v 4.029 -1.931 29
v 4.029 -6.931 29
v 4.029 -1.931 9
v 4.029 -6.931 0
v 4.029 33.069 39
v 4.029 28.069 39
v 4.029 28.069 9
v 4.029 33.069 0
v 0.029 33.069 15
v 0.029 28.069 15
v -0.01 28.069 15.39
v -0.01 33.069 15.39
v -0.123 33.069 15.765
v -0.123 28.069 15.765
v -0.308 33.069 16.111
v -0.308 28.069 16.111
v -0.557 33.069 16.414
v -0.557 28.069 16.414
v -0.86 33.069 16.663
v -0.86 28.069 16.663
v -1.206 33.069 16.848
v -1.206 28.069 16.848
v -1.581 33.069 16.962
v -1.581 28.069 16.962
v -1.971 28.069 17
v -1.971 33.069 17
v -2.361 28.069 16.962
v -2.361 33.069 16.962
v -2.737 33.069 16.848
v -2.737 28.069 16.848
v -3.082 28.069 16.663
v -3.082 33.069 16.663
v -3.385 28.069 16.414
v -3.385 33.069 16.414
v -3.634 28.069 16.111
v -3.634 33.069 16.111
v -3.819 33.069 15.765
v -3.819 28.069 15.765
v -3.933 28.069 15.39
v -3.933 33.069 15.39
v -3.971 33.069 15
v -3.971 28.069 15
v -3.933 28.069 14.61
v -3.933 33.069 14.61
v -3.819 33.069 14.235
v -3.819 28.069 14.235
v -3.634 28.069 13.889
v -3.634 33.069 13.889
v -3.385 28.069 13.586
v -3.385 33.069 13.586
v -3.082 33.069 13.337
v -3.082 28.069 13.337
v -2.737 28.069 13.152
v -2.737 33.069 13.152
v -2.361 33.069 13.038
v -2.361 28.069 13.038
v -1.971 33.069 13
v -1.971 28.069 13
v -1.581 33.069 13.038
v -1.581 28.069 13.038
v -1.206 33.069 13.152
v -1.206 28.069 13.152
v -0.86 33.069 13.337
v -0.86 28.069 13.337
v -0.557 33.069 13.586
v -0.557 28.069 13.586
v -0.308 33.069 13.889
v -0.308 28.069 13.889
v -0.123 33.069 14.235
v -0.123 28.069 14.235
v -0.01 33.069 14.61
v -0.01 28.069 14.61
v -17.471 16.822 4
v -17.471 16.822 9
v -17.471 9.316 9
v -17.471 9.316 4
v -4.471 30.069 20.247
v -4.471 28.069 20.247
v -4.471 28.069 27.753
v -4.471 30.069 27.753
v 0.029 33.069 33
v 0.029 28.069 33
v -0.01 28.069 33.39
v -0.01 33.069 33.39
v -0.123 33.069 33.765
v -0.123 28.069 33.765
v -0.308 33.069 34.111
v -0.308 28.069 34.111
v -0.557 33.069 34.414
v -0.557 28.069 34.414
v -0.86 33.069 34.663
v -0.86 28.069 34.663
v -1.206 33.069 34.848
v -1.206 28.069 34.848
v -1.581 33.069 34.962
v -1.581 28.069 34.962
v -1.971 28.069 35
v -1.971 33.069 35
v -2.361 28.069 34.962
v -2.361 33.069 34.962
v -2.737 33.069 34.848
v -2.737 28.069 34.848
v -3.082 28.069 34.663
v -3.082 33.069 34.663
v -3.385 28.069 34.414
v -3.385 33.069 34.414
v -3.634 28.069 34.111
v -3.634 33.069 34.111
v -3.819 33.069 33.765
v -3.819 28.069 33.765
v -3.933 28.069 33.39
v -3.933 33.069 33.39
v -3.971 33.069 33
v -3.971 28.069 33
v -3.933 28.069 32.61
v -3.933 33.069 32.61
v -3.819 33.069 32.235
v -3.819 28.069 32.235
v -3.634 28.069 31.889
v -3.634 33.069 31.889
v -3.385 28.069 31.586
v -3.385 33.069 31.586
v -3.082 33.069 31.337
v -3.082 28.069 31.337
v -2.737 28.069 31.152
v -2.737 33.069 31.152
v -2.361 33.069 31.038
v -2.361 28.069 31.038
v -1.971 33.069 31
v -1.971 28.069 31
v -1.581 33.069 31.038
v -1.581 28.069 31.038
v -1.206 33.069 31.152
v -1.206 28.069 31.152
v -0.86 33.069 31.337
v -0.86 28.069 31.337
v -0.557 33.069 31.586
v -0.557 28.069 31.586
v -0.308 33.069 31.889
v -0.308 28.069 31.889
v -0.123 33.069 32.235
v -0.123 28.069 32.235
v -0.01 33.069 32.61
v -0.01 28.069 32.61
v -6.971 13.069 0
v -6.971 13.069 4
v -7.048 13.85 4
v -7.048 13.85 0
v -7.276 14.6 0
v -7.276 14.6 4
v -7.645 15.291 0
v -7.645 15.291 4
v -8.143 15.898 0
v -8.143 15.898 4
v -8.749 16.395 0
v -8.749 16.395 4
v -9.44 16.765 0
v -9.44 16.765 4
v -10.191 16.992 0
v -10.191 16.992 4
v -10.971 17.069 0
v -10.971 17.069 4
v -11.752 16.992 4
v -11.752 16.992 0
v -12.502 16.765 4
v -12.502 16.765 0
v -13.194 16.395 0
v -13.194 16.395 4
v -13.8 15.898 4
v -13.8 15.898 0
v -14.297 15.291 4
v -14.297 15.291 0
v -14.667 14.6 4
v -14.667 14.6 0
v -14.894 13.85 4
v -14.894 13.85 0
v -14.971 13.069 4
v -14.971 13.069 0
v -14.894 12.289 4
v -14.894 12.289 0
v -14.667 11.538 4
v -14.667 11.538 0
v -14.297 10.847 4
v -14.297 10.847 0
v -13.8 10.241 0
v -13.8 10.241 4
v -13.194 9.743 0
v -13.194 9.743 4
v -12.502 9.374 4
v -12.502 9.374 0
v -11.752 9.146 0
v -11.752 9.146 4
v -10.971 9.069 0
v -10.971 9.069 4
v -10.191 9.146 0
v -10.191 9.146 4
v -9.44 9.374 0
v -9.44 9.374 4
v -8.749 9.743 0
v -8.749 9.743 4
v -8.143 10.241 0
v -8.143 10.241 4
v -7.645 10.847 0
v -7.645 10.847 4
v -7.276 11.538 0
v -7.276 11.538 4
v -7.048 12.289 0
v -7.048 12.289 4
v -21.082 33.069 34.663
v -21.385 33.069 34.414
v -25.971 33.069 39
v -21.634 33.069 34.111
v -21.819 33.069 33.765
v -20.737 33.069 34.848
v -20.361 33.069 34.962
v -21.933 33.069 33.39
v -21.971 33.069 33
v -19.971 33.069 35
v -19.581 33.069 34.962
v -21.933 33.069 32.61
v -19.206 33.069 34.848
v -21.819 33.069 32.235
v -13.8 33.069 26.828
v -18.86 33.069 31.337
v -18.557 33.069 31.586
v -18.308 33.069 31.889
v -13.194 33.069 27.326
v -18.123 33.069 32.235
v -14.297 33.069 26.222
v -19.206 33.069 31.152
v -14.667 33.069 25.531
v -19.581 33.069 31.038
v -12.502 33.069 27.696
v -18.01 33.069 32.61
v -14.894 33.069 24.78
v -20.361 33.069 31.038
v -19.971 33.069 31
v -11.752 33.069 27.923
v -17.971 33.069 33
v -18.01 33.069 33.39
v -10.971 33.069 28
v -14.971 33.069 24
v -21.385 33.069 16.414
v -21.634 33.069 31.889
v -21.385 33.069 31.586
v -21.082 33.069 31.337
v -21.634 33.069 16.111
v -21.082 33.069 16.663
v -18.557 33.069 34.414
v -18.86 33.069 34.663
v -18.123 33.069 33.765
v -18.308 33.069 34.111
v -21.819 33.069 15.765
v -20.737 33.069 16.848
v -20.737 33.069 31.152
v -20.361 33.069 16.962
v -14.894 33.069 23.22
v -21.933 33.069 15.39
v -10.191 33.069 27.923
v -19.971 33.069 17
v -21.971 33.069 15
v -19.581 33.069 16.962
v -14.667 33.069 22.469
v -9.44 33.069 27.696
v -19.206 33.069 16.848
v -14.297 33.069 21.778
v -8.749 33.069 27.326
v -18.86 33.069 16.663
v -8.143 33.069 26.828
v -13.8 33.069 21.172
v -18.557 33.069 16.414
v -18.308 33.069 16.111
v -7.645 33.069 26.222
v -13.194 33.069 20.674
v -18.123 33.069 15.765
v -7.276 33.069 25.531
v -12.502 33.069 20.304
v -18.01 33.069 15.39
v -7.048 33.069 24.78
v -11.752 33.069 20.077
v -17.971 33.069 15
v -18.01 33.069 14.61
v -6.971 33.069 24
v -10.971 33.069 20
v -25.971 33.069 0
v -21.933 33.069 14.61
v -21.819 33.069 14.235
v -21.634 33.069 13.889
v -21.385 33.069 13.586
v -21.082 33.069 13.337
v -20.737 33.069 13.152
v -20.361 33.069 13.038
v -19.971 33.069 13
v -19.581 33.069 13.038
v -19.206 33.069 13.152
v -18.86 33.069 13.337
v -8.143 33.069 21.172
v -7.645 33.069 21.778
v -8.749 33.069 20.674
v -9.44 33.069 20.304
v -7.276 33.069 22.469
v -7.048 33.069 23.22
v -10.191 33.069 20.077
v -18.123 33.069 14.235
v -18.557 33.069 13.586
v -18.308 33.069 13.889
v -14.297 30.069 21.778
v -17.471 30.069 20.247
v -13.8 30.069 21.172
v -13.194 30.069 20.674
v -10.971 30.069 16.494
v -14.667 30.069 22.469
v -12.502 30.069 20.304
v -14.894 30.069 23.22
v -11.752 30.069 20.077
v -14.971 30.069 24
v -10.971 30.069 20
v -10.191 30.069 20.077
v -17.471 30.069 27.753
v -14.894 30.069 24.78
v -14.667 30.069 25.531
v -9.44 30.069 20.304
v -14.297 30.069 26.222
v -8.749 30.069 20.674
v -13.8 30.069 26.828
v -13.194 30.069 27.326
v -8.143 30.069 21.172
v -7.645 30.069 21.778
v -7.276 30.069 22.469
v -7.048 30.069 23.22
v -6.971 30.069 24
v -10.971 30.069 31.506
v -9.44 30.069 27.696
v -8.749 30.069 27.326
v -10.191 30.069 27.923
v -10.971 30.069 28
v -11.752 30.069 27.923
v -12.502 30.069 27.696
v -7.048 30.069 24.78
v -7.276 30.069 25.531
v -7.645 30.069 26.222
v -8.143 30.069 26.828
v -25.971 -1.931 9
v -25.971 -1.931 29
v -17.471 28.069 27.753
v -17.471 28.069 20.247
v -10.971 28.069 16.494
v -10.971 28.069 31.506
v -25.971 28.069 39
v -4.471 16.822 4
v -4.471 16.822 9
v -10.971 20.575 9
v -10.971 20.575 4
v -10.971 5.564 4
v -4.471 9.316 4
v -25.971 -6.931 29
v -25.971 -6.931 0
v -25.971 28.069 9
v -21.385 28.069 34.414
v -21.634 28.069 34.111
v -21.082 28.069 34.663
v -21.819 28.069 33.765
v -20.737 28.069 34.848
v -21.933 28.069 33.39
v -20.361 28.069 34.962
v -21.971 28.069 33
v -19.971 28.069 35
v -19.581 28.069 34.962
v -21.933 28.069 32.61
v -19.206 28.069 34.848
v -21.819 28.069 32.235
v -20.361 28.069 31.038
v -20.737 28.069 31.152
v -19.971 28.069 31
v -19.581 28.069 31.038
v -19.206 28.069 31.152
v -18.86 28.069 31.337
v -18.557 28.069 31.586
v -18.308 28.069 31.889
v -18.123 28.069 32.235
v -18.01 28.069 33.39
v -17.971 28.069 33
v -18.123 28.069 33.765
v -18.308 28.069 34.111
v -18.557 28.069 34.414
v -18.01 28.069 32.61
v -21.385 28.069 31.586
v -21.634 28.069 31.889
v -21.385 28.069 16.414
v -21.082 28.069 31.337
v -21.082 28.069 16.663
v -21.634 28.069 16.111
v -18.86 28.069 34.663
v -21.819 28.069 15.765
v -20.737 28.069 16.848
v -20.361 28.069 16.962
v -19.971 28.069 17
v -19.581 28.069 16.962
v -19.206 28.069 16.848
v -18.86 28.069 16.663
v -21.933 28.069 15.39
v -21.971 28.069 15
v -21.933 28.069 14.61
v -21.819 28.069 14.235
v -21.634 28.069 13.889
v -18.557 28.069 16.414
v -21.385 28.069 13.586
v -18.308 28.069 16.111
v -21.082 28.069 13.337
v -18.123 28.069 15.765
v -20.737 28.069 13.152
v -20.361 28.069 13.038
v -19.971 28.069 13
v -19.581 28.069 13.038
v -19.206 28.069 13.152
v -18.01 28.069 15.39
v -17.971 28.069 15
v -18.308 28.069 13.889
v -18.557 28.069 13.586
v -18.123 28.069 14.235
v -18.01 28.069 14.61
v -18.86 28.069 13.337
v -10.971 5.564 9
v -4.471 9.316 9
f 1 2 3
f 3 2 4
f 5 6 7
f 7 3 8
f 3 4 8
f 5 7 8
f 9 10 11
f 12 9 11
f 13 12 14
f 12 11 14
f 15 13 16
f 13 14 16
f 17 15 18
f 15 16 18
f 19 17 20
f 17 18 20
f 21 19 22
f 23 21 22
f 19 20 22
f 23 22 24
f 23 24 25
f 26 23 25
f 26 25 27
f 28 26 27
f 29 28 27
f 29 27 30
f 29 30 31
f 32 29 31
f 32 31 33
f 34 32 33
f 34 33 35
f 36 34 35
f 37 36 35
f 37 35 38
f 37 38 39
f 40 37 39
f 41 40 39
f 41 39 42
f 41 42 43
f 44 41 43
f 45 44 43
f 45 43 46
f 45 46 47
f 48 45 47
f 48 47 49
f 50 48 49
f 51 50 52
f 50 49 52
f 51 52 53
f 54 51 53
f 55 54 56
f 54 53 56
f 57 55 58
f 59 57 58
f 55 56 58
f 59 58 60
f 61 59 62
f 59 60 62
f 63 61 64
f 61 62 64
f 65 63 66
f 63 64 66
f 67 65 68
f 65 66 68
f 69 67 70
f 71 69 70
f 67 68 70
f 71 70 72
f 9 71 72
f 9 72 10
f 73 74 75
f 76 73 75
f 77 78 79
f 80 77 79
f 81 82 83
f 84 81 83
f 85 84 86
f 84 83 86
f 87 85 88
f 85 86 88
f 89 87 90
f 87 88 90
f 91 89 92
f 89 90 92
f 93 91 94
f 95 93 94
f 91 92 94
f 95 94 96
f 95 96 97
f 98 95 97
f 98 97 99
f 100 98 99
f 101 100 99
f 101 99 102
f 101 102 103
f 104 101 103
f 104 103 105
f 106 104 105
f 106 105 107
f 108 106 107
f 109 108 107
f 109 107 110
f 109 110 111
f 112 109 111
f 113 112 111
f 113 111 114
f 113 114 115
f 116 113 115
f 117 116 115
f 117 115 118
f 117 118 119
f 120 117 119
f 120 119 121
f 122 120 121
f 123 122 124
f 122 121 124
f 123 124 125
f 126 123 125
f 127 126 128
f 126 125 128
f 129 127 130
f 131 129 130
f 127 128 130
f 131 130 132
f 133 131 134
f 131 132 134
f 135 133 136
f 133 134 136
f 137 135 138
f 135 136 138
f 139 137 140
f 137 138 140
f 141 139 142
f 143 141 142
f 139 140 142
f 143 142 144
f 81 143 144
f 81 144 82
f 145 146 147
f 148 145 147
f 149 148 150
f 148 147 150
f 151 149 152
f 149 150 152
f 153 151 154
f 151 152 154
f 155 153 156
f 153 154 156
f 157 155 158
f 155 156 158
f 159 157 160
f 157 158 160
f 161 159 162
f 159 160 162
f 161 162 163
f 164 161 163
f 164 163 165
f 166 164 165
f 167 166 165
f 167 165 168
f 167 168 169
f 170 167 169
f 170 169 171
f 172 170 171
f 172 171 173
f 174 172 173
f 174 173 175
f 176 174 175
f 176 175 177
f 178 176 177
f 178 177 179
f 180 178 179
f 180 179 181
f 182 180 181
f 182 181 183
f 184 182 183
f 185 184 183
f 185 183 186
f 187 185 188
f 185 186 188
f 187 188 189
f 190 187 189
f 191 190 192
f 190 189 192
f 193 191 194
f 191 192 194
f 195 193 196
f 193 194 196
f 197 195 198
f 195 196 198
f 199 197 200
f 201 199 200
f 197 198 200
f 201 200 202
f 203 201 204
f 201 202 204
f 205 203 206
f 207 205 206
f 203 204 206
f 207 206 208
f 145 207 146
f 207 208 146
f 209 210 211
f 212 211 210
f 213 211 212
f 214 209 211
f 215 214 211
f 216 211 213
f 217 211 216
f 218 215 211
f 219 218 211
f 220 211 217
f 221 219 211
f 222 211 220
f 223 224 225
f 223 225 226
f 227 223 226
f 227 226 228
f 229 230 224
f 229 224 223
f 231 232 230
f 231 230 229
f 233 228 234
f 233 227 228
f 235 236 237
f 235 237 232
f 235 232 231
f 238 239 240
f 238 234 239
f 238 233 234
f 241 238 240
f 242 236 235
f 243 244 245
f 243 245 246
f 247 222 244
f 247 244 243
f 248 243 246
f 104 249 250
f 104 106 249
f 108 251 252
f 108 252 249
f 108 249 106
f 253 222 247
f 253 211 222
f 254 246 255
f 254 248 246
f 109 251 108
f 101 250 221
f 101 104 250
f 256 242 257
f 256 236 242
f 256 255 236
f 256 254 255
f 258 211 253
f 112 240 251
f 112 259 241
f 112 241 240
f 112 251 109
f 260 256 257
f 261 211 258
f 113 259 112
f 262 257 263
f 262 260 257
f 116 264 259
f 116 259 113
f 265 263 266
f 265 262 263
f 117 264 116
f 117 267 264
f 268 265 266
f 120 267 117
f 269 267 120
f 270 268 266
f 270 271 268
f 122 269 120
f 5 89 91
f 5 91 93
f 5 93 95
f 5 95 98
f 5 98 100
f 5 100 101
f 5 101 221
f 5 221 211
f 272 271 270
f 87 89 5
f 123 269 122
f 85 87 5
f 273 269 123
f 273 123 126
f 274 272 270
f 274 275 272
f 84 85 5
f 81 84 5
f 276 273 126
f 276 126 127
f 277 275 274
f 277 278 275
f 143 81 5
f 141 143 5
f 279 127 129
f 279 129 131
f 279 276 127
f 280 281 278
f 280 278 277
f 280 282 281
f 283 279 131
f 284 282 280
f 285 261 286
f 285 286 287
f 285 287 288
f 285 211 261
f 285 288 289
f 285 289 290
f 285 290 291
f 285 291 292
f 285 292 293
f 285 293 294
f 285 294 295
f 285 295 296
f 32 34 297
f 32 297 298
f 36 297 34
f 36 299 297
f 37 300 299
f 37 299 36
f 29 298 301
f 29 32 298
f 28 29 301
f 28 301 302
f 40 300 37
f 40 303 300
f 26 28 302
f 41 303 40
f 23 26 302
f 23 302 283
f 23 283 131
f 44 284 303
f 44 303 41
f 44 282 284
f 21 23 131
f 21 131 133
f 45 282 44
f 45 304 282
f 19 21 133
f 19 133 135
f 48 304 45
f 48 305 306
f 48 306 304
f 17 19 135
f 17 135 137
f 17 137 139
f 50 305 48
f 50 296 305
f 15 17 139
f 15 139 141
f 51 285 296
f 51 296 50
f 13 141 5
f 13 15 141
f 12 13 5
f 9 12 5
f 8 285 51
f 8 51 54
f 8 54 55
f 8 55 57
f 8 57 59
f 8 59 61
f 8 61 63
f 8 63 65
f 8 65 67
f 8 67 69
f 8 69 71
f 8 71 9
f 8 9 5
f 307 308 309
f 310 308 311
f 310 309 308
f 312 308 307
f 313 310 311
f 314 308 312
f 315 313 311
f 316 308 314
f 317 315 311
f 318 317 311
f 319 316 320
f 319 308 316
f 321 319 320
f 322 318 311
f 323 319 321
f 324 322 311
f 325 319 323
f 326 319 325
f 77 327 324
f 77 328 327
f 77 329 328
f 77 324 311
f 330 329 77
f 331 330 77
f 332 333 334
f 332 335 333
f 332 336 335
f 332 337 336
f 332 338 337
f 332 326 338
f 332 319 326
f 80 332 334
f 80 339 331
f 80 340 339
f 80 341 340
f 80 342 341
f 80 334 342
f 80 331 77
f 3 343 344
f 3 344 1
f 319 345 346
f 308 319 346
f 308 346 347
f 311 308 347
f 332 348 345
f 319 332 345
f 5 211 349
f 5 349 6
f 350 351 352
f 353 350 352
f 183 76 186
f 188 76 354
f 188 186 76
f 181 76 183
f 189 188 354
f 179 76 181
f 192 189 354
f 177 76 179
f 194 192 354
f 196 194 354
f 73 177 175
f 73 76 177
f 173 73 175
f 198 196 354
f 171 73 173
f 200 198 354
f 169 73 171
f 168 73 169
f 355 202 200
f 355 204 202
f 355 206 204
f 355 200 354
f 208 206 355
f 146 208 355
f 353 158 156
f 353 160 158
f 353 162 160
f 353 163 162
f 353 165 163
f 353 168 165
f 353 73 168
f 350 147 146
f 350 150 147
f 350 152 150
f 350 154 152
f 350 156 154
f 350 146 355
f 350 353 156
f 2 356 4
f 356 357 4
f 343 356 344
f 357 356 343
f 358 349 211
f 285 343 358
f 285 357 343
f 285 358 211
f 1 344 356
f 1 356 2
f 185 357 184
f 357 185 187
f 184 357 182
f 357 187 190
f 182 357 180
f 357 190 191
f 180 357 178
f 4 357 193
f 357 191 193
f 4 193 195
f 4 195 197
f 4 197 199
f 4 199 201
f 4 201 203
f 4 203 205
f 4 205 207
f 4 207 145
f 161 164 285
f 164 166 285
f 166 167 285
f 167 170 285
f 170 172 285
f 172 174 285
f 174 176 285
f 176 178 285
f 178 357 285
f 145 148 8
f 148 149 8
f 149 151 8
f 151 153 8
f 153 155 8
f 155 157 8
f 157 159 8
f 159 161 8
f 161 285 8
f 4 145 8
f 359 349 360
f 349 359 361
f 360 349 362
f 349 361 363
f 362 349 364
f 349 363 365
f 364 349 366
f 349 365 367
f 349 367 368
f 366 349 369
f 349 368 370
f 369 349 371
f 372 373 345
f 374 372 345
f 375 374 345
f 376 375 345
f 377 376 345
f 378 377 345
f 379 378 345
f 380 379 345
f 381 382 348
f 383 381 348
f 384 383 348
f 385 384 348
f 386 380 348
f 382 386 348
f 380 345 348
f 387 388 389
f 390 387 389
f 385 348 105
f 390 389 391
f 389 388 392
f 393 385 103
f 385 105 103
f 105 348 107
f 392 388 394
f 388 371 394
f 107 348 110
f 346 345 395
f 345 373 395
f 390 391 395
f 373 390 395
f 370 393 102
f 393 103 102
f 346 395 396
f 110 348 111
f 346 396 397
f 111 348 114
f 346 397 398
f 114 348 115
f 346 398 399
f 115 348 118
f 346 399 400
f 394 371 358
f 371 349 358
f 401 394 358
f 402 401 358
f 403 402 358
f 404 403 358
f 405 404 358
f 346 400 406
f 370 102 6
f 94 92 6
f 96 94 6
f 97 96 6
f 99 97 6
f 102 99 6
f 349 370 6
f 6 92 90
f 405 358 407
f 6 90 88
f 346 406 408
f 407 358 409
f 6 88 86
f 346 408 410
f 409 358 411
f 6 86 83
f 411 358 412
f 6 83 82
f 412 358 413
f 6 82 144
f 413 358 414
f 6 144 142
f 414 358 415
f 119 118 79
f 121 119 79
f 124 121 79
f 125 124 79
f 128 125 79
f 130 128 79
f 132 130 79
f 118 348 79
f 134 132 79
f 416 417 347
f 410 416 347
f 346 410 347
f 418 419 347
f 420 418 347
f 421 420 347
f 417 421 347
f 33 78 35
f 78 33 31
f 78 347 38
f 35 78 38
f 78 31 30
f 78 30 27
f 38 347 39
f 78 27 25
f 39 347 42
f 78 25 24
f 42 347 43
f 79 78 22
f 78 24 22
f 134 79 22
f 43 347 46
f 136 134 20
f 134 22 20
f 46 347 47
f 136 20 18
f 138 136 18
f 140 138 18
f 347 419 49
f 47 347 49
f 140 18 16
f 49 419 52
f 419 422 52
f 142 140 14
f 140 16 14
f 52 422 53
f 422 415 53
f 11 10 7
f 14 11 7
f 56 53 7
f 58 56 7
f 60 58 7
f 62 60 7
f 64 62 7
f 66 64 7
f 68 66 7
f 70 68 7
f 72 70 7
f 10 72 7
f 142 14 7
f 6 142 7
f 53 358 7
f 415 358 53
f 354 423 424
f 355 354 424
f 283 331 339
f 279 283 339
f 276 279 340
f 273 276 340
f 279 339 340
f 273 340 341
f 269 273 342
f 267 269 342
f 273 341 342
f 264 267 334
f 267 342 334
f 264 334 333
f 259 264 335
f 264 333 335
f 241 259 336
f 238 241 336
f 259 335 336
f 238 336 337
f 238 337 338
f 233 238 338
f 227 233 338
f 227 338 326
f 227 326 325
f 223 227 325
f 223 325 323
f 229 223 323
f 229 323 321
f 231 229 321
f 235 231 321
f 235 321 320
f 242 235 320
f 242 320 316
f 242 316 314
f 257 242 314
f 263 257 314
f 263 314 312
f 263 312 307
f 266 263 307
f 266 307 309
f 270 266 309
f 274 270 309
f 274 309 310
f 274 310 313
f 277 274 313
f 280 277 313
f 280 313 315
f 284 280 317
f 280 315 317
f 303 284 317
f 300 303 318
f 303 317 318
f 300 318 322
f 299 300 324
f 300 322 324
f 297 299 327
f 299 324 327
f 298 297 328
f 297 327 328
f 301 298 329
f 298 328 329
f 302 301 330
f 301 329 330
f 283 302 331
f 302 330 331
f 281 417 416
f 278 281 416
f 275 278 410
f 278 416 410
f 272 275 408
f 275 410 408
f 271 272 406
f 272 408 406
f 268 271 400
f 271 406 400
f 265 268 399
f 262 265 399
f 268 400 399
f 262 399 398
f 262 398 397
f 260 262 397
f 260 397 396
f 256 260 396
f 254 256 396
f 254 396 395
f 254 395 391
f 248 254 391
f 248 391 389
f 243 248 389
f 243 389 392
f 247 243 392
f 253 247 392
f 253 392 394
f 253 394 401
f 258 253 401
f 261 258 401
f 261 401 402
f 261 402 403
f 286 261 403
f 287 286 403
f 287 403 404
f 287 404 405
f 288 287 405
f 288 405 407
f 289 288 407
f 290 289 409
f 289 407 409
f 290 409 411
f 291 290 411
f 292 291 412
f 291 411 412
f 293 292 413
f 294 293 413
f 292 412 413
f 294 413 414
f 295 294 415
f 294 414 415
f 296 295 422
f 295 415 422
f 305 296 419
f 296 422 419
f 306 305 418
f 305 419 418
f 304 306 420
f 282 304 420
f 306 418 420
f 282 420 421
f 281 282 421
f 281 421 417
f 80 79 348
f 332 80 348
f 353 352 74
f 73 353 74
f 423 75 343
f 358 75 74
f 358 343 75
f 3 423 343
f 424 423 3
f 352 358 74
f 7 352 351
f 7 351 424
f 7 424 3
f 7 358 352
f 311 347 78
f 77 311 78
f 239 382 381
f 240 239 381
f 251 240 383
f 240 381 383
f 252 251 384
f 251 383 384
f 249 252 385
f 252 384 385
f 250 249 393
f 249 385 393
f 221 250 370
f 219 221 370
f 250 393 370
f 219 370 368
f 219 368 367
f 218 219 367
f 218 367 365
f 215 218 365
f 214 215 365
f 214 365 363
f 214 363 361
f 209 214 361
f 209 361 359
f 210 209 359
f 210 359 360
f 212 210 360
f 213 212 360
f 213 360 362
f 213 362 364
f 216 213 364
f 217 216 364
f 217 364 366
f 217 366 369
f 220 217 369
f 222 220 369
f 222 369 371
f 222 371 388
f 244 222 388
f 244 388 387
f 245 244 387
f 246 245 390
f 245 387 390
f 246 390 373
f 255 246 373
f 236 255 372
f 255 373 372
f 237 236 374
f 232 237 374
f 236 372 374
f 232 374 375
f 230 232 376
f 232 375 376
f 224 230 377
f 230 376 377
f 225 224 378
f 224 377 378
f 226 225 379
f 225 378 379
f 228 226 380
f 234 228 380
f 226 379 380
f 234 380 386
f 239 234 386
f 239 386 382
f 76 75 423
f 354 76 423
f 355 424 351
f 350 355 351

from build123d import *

# Parameters (mm, degrees)
SKETCH_W        = 30
SKETCH_H        = 40
PAD_DEPTH       = 9
SKETCH002_W     = 30
SKETCH002_H     = 5
PAD001_DEPTH    = 30
SKETCH003_R     = 2
SKETCH003_R_2   = 4
POCKET_DEPTH    = 5.001
POCKET001_DEPTH = 2
SKETCH007_W     = 30
SKETCH007_H     = 5
PAD002_DEPTH    = 20
SKETCH008_R     = 4
POCKET002_DEPTH = 9.001
POCKET003_DEPTH = 5


with BuildPart() as part:
    # Sketch → Pad (new body)
    with BuildSketch(Plane.XY):
        with Locations((-10.97123, 13.069184)):
            Rectangle(SKETCH_W, SKETCH_H)
    extrude(amount=PAD_DEPTH)

    # Sketch002 (on Face6 of Pad) → Pad001 (join)
    with BuildSketch(Plane.XY.offset(9)):
        with Locations((-10.97123, 30.569184)):
            Rectangle(SKETCH002_W, SKETCH002_H)
    extrude(amount=PAD001_DEPTH)

    # Sketch003 (on Face11 of Pad001) → Pocket (cut, through all)
    with BuildSketch(Plane.XZ.offset(-28.069184)):
        with Locations((-1.97123, 33)):
            Circle(SKETCH003_R)
        with Locations((-19.97123, 33)):
            Circle(SKETCH003_R)
        with Locations((-19.97123, 15)):
            Circle(SKETCH003_R)
        with Locations((-1.97123, 15)):
            Circle(SKETCH003_R)
        with Locations((-10.97123, 24)):
            Circle(SKETCH003_R_2)
    extrude(amount=-POCKET_DEPTH, mode=Mode.SUBTRACT)

    # Sketch005 (on Face16 of Pocket) → Pocket001 (cut)
    with BuildSketch(Plane.XZ.offset(-28.069184)):
        Polygon((-4.47123, 27.752777), (-10.97123, 31.505553), (-17.47123, 27.752777), (-17.47123, 20.247223), (-10.97123, 16.494447), (-4.47123, 20.247223), align=None)
    extrude(amount=-POCKET001_DEPTH, mode=Mode.SUBTRACT)

    # Sketch007 (on Face7 of Pocket001) → Pad002 (join)
    with BuildSketch(Plane.XY.offset(9)):
        with Locations((-10.97123, -4.430816)):
            Rectangle(SKETCH007_W, SKETCH007_H)
    extrude(amount=PAD002_DEPTH)

    # Sketch008 (on Face8 of Pad002) → Pocket002 (cut, through all)
    with BuildSketch(Plane.XY.offset(9)):
        with Locations((-10.97123, 13.069184)):
            Circle(SKETCH008_R)
    extrude(amount=-POCKET002_DEPTH, mode=Mode.SUBTRACT)

    # Sketch009 (on Face8 of Pocket002) → Pocket003 (cut)
    with BuildSketch(Plane.XY.offset(9)):
        Polygon((-4.47123, 16.821961), (-10.97123, 20.574738), (-17.47123, 16.821961), (-17.47123, 9.316407), (-10.97123, 5.563631), (-4.47123, 9.316407), align=None)
    extrude(amount=-POCKET003_DEPTH, mode=Mode.SUBTRACT)


solid = part.part
